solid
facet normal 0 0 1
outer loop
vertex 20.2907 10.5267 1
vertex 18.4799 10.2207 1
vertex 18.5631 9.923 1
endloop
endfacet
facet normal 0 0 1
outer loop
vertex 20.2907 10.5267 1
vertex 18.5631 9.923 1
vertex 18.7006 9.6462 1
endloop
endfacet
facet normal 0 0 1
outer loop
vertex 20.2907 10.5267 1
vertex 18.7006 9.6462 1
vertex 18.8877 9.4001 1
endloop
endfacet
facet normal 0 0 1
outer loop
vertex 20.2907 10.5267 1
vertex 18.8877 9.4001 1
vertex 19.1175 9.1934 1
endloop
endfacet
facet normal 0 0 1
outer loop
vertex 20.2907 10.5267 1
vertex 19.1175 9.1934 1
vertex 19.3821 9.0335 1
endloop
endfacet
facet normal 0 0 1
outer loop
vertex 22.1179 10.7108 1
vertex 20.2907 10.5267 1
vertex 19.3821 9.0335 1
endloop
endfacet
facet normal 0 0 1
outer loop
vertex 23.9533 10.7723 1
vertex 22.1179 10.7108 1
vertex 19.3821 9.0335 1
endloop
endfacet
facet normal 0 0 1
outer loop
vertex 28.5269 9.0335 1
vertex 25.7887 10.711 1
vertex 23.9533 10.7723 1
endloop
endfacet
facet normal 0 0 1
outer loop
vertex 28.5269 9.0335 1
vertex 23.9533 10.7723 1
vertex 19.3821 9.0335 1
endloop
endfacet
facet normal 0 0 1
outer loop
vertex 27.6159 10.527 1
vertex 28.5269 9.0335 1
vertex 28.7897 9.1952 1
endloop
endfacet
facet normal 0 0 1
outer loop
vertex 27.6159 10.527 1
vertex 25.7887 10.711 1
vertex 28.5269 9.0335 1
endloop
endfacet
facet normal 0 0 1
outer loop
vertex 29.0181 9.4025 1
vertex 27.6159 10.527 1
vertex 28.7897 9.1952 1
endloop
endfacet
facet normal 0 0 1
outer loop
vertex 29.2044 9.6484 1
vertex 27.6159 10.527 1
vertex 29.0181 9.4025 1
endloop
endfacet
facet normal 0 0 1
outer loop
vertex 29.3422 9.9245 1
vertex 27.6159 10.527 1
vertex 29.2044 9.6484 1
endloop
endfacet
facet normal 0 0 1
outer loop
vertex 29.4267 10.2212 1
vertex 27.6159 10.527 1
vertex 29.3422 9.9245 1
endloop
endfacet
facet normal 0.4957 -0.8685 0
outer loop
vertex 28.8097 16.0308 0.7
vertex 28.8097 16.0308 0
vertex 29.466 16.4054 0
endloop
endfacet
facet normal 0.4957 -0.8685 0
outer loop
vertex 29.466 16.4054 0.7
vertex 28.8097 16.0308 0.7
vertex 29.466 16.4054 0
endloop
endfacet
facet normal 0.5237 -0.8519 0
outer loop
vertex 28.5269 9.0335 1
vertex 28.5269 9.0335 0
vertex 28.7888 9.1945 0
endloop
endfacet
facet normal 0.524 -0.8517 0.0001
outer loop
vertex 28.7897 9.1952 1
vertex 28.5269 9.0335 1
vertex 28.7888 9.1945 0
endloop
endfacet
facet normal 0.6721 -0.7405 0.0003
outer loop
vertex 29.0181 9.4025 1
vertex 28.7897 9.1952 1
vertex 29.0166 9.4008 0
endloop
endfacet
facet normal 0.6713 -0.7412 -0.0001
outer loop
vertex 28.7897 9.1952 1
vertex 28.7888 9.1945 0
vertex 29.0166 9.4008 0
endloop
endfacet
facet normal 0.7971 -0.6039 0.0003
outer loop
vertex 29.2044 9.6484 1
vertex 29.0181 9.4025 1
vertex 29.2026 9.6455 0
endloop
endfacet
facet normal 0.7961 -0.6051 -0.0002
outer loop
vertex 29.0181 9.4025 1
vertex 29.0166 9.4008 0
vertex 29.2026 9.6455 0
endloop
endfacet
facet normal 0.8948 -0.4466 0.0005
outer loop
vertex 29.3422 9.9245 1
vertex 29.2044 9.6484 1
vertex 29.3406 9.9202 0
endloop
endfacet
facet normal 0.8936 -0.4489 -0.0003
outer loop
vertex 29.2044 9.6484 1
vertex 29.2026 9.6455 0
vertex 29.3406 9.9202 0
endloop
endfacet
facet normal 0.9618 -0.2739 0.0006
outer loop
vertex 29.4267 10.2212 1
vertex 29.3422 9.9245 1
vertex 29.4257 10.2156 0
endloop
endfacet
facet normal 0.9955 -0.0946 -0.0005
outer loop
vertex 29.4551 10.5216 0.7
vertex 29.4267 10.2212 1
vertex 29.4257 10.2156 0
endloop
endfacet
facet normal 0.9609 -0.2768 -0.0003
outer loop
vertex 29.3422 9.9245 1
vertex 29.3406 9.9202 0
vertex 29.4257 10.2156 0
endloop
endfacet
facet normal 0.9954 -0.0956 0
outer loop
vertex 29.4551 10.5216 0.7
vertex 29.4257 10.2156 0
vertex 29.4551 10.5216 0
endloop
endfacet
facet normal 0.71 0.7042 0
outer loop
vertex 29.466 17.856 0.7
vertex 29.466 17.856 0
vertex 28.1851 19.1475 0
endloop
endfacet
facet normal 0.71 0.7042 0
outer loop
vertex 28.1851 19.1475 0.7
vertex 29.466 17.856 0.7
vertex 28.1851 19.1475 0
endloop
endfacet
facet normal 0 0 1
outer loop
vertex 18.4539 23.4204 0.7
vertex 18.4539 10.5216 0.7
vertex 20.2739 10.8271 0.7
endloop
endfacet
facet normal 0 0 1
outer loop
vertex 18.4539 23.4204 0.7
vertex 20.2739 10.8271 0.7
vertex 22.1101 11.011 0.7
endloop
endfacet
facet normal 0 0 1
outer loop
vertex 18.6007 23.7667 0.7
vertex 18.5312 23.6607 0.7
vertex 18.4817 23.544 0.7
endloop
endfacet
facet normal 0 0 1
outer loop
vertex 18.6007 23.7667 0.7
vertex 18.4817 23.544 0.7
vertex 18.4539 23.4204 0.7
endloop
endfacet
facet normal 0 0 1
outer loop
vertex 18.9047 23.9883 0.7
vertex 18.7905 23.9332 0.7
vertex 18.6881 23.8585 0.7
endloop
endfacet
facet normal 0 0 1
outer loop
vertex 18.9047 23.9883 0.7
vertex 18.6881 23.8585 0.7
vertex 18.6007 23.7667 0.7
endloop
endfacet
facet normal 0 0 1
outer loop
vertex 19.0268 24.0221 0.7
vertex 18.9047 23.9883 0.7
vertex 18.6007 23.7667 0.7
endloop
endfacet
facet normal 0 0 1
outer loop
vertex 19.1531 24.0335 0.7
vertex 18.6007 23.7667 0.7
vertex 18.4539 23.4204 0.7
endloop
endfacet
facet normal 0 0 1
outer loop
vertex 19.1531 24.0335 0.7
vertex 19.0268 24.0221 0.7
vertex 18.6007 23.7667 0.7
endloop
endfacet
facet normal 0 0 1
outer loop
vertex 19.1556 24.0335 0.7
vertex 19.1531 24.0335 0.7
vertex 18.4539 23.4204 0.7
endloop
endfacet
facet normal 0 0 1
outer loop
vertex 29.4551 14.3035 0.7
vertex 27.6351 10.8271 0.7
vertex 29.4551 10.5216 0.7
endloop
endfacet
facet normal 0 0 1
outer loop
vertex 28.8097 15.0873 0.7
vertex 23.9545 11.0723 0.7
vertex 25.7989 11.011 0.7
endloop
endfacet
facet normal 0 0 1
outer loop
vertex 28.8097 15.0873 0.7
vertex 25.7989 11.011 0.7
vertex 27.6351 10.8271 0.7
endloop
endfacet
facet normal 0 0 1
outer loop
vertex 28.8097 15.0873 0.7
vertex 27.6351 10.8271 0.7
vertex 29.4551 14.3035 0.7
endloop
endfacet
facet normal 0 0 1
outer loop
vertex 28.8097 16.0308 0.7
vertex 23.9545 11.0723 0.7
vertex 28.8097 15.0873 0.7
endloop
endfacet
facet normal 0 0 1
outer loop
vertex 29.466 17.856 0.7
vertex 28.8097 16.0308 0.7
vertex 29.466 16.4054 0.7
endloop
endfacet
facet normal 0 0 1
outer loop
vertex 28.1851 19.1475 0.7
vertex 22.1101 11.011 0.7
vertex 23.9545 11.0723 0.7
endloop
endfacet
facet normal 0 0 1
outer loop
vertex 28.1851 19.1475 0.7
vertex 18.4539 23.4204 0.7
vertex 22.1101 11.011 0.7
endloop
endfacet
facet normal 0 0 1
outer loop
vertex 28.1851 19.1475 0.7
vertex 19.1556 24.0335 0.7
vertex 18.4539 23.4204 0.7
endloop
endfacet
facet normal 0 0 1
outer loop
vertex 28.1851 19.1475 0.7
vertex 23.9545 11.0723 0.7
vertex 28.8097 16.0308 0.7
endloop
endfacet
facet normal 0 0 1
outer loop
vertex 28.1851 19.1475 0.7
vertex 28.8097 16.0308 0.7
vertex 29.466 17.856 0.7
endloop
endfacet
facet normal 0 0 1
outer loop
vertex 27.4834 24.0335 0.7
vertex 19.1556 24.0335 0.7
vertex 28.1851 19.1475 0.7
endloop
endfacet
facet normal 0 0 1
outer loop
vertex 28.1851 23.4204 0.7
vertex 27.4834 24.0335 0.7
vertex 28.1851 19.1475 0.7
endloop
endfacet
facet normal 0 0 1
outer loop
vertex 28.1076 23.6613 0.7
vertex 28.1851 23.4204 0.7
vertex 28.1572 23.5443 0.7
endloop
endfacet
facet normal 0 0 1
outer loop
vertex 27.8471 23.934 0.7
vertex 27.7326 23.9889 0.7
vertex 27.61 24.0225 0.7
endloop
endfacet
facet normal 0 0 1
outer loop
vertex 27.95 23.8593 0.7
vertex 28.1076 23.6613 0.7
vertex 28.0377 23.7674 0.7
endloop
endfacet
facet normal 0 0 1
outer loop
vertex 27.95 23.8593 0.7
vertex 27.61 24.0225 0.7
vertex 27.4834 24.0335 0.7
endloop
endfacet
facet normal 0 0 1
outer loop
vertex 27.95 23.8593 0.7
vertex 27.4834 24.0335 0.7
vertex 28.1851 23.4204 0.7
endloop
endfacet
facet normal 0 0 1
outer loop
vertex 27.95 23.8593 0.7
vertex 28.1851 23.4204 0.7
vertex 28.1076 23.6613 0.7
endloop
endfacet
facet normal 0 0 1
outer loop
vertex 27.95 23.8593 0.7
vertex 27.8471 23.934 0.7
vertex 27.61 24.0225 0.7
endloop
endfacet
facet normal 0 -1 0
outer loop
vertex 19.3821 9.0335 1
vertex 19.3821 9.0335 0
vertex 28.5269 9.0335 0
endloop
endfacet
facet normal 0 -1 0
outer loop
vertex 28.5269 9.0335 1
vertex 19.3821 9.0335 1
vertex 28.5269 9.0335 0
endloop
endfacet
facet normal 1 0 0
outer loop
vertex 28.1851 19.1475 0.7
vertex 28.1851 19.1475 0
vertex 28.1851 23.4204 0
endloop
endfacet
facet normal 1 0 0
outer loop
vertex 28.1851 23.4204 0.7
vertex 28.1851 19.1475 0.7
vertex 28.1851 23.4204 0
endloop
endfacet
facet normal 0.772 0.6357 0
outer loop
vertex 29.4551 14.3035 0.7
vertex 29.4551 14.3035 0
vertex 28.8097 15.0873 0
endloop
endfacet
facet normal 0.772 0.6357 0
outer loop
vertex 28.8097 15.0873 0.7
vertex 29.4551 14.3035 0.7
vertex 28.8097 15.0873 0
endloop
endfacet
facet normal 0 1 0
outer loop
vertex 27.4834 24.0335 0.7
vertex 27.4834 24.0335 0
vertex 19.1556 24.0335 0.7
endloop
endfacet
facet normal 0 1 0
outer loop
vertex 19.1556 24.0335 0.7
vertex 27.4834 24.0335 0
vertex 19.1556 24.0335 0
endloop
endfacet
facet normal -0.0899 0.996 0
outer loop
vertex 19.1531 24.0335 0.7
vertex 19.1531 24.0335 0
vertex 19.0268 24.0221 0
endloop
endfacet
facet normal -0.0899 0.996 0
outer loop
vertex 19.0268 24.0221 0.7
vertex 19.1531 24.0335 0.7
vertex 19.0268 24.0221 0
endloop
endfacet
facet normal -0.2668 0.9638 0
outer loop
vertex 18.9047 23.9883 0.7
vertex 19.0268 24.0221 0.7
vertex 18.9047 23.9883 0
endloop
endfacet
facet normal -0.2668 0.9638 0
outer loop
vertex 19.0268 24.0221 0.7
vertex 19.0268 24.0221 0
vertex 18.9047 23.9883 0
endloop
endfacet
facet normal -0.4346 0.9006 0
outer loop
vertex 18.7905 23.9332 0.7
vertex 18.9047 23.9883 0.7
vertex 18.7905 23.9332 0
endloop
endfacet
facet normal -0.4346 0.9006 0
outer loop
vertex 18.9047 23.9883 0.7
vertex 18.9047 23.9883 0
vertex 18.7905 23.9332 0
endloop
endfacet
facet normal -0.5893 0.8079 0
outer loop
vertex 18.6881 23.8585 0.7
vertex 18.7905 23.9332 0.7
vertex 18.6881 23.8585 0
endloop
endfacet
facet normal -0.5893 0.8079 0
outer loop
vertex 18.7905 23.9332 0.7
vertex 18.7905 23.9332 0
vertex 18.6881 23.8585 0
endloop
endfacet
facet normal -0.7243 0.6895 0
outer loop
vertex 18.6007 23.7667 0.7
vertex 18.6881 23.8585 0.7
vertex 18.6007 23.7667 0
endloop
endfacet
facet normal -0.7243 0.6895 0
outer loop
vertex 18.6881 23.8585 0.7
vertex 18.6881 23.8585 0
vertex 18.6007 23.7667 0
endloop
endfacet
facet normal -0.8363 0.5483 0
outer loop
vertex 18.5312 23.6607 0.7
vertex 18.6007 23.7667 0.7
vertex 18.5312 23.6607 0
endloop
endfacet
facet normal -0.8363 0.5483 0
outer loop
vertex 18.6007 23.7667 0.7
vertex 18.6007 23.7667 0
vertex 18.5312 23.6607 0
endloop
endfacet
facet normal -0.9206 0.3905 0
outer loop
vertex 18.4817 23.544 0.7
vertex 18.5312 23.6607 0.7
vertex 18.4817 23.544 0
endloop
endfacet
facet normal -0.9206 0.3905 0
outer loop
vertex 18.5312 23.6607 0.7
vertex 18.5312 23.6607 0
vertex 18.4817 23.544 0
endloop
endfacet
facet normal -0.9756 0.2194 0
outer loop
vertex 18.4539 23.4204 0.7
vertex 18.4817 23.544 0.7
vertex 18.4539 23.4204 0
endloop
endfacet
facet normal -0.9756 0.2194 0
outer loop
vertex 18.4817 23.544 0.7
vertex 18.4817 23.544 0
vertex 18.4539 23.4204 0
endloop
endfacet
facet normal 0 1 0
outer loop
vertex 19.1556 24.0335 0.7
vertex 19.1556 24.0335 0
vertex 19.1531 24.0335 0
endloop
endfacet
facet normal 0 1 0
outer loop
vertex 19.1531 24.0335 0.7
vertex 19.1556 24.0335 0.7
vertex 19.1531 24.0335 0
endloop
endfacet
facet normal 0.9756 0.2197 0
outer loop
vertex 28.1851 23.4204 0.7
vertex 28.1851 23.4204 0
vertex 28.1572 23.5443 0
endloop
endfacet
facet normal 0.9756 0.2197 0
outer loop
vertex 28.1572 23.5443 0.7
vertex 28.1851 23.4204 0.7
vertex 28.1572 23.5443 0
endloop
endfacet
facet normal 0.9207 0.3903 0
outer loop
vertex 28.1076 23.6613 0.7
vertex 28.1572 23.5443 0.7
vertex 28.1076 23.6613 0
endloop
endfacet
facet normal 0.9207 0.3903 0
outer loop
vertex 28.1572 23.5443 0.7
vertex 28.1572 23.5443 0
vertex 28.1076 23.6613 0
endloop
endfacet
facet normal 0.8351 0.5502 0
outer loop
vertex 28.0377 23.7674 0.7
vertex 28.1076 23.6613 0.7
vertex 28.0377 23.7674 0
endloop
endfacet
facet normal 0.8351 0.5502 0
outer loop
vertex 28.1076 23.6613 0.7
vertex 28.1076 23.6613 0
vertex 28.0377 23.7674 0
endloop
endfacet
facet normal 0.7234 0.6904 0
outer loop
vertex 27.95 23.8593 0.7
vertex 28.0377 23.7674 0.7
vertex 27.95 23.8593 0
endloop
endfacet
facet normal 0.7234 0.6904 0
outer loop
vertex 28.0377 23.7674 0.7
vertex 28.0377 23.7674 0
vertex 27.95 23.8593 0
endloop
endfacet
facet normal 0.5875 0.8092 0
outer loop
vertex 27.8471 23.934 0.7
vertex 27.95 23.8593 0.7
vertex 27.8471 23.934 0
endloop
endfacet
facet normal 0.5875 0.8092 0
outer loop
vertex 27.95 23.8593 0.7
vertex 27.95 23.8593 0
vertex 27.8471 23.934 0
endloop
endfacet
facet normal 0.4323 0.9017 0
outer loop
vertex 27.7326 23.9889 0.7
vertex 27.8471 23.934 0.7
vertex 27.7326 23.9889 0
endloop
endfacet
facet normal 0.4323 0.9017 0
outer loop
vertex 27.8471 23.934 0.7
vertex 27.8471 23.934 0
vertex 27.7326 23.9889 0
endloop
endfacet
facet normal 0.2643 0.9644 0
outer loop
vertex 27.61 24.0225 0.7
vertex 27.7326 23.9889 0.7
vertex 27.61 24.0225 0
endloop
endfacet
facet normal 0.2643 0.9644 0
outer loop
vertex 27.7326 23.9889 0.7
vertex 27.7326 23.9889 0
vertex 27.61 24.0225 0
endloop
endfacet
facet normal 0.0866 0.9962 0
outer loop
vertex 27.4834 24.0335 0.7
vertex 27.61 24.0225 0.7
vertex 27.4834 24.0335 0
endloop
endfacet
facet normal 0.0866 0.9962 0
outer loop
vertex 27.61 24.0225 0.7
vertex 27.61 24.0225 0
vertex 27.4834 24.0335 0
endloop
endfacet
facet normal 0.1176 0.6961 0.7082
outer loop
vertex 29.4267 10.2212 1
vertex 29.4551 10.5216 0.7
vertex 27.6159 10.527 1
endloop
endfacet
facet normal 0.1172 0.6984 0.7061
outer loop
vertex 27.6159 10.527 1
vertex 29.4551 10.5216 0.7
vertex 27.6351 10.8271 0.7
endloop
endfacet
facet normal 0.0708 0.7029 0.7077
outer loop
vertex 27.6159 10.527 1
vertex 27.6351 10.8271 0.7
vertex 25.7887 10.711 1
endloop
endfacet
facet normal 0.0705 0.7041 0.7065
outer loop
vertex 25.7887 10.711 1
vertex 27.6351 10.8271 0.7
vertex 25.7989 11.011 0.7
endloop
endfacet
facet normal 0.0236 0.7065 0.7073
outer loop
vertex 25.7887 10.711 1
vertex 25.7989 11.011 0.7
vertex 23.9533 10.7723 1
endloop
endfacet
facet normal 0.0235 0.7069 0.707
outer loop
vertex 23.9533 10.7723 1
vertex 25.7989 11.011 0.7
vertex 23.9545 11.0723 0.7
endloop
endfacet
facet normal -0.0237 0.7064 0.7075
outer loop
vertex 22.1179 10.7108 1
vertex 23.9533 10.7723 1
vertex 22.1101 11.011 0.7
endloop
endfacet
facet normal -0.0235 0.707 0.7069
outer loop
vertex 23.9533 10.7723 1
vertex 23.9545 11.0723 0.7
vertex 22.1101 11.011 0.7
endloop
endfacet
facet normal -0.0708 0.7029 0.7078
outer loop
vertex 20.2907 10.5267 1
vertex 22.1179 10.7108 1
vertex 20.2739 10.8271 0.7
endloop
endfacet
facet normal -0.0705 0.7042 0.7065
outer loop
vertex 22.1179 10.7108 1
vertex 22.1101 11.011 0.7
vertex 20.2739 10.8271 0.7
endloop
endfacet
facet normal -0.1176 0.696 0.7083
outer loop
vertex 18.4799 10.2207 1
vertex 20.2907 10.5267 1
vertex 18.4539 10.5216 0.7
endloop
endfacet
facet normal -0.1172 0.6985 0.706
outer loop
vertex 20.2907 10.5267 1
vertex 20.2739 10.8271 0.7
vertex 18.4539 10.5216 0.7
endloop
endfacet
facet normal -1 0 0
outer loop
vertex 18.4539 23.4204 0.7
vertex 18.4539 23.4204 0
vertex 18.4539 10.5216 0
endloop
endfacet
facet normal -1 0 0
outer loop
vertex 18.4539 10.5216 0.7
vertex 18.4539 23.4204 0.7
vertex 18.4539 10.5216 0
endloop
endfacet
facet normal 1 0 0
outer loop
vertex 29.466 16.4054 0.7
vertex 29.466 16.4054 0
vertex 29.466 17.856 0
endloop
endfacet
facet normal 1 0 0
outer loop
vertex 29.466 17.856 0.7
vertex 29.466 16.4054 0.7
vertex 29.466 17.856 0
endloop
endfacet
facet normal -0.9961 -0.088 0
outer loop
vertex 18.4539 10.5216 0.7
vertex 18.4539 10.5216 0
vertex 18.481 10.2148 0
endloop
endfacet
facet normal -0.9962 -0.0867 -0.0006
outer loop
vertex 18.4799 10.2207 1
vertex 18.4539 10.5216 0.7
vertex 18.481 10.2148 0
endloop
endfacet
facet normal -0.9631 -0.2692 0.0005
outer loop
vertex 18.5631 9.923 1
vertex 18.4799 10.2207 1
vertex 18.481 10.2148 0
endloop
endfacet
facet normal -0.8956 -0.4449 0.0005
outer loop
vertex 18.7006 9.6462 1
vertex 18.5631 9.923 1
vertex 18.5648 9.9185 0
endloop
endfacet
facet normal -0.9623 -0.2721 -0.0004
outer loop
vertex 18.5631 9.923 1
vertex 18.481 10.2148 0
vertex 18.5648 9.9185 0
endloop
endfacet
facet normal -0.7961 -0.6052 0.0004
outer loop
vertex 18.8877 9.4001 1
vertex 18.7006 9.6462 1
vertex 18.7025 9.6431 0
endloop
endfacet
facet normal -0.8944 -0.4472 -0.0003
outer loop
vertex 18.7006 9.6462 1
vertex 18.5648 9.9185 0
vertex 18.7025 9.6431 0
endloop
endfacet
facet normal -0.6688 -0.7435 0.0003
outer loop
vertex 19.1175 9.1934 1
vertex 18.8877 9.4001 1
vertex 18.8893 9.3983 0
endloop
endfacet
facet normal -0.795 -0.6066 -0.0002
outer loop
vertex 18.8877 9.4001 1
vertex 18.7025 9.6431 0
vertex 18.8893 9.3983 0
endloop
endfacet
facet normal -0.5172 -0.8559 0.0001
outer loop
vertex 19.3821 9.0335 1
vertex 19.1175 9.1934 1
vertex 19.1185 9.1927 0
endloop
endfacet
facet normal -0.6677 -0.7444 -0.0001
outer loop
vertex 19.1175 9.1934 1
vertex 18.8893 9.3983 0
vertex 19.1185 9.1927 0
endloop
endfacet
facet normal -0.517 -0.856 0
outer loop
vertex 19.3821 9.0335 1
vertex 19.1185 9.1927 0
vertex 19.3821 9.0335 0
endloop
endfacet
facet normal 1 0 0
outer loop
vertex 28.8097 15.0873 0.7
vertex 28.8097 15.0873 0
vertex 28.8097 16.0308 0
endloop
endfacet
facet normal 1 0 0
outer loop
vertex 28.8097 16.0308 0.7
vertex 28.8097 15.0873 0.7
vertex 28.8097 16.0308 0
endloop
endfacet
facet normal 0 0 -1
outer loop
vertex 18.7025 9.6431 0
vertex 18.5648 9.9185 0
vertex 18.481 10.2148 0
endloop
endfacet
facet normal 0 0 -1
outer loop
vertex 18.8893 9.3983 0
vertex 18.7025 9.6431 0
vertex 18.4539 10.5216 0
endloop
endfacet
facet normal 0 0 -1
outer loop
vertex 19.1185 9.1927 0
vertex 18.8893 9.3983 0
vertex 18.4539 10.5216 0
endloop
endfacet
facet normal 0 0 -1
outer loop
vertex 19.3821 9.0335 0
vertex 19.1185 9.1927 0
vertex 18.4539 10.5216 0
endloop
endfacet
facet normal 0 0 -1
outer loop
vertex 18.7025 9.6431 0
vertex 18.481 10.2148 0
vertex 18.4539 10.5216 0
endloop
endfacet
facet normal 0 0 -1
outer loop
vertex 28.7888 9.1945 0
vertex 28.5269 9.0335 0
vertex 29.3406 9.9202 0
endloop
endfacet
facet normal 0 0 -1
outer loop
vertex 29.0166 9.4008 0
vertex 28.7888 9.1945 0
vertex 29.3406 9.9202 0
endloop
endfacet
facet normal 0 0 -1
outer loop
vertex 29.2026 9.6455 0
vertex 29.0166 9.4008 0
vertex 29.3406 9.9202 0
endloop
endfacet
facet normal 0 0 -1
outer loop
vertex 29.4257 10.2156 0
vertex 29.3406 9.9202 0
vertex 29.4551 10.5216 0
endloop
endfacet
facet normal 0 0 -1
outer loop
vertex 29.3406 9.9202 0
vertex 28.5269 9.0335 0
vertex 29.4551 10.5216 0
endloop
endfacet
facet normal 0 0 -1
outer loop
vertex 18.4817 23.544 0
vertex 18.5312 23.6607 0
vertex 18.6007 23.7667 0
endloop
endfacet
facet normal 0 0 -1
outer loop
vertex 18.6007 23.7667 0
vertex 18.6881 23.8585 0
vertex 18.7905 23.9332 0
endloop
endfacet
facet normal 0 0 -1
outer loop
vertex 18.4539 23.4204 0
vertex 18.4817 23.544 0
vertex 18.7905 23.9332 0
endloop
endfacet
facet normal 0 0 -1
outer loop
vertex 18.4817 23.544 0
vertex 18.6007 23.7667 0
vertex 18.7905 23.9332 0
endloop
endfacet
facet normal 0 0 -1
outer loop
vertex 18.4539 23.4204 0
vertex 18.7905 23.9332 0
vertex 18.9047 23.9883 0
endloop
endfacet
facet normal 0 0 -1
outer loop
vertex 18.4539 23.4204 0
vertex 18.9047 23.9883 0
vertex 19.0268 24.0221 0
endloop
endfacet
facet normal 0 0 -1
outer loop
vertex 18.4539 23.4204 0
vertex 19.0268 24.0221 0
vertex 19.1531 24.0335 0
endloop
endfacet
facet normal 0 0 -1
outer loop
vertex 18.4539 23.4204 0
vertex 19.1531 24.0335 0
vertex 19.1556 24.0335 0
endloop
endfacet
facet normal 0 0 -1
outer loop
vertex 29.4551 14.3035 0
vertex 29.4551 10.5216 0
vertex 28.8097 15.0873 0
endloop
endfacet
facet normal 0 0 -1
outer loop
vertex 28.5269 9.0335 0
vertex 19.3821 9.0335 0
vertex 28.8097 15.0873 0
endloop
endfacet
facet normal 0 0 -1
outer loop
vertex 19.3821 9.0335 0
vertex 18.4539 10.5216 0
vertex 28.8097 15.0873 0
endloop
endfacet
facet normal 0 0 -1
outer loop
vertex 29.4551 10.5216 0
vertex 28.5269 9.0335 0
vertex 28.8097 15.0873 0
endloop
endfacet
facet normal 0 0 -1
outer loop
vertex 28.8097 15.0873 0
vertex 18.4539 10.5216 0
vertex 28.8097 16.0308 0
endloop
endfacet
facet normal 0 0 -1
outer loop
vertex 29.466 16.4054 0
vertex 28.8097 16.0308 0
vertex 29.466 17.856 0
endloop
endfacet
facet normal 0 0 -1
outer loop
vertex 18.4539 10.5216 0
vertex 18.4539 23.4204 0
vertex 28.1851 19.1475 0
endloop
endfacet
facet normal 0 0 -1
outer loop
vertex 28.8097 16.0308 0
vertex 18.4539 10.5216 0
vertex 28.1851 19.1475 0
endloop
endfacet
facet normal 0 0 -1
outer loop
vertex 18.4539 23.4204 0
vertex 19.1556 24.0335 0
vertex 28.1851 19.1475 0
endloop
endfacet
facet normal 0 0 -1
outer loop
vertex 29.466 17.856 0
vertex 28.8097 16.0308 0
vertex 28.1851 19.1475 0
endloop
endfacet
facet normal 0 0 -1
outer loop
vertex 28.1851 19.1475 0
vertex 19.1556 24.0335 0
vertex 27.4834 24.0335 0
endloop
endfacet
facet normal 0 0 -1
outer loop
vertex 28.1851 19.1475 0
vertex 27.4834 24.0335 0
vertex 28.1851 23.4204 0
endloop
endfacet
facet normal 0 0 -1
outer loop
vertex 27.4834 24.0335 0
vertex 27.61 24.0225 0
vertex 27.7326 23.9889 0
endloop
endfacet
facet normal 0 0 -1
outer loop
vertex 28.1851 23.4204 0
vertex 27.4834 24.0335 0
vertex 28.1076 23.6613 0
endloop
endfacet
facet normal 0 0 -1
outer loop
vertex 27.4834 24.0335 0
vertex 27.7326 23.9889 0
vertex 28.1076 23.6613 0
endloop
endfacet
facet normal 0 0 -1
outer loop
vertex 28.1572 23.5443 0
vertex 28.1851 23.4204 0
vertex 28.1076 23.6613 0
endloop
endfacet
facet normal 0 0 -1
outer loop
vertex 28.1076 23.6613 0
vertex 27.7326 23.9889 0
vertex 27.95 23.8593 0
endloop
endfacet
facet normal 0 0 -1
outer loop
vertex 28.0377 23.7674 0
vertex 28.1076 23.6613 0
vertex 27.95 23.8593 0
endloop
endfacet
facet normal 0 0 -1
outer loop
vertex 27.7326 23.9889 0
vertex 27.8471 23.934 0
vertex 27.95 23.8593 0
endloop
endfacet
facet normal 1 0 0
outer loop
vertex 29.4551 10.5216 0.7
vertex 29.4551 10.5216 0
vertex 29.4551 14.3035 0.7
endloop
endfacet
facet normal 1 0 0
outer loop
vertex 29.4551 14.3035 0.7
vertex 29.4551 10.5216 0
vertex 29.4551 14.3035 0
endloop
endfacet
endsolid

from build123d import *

# Parameters (mm, degrees)
EXTRUDE1_DEPTH = 0.7
EXTRUDE2_DEPTH = 1
DRAFT1_ANGLE   = 45


with BuildPart() as part:
    # Sketch1 → Extrude1 (new body)
    with BuildSketch(Plane.XY):
        with BuildLine():
            Line((19.155576725, 24.033479545), (19.153057259, 24.033479546))
            ThreePointArc((19.153057259, 24.033479546), (18.688120429, 23.858493389), (18.453932737, 23.42038092))
            Line((18.453932737, 23.42038092), (18.453932737, 10.52156184))
            ThreePointArc((18.453932737, 10.52156184), (23.954511515, 11.07234739), (29.455090293, 10.52156184))
            Line((29.455090293, 10.52156184), (29.455090293, 14.303453829))
            Line((29.455090293, 14.303453829), (28.809678981, 15.087349513))
            Line((28.809678981, 15.087349513), (28.809678981, 16.030799168))
            Line((28.809678981, 16.030799168), (29.465965334, 16.405404217))
            Line((29.465965334, 16.405404217), (29.465965334, 17.856041137))
            Line((29.465965334, 17.856041137), (28.185089103, 19.147527308))
            Line((28.185089103, 19.147527308), (28.185089103, 23.42038092))
            ThreePointArc((28.185089103, 23.42038092), (27.949953539, 23.859323131), (27.483445115, 24.033475046))
            Line((27.483445115, 24.033475046), (19.155576725, 24.033479545))
        make_face()
        with BuildLine():
            Line((19.382079549, 9.033491555), (28.526943481, 9.033491554))
            ThreePointArc((28.526943481, 9.033491554), (29.202633724, 9.645535961), (29.455090293, 10.52156184))
            ThreePointArc((29.455090293, 10.52156184), (23.954511515, 11.07234739), (18.453932737, 10.52156184))
            ThreePointArc((18.453932737, 10.52156184), (18.702527644, 9.643127345), (19.382079549, 9.033491555))
        make_face()
    extrude(amount=EXTRUDE1_DEPTH)

    # Sketch2 → Extrude2 (add)
    with BuildSketch(Plane.XY):
        with BuildLine():
            Line((19.382079549, 9.033491555), (28.526943481, 9.033491554))
            ThreePointArc((28.526943481, 9.033491554), (29.202633724, 9.645535961), (29.455090293, 10.52156184))
            ThreePointArc((29.455090293, 10.52156184), (23.954511515, 11.072347393), (18.453932737, 10.52156184))
            ThreePointArc((18.453932737, 10.52156184), (18.702527644, 9.643127345), (19.382079549, 9.033491555))
        make_face()
    extrude(amount=EXTRUDE2_DEPTH)

    # Draft1
    draft1_faces = [part.faces().sort_by_distance(p)[0] for p in [
        (23.954511515, 11.072347393, 0.85),
    ]]
    draft(draft1_faces, Plane(origin=(23.959933723, 1.918279908, 0.7), x_dir=(1, 0, 0), z_dir=(0, 0, 1)), DRAFT1_ANGLE)


solid = part.part
